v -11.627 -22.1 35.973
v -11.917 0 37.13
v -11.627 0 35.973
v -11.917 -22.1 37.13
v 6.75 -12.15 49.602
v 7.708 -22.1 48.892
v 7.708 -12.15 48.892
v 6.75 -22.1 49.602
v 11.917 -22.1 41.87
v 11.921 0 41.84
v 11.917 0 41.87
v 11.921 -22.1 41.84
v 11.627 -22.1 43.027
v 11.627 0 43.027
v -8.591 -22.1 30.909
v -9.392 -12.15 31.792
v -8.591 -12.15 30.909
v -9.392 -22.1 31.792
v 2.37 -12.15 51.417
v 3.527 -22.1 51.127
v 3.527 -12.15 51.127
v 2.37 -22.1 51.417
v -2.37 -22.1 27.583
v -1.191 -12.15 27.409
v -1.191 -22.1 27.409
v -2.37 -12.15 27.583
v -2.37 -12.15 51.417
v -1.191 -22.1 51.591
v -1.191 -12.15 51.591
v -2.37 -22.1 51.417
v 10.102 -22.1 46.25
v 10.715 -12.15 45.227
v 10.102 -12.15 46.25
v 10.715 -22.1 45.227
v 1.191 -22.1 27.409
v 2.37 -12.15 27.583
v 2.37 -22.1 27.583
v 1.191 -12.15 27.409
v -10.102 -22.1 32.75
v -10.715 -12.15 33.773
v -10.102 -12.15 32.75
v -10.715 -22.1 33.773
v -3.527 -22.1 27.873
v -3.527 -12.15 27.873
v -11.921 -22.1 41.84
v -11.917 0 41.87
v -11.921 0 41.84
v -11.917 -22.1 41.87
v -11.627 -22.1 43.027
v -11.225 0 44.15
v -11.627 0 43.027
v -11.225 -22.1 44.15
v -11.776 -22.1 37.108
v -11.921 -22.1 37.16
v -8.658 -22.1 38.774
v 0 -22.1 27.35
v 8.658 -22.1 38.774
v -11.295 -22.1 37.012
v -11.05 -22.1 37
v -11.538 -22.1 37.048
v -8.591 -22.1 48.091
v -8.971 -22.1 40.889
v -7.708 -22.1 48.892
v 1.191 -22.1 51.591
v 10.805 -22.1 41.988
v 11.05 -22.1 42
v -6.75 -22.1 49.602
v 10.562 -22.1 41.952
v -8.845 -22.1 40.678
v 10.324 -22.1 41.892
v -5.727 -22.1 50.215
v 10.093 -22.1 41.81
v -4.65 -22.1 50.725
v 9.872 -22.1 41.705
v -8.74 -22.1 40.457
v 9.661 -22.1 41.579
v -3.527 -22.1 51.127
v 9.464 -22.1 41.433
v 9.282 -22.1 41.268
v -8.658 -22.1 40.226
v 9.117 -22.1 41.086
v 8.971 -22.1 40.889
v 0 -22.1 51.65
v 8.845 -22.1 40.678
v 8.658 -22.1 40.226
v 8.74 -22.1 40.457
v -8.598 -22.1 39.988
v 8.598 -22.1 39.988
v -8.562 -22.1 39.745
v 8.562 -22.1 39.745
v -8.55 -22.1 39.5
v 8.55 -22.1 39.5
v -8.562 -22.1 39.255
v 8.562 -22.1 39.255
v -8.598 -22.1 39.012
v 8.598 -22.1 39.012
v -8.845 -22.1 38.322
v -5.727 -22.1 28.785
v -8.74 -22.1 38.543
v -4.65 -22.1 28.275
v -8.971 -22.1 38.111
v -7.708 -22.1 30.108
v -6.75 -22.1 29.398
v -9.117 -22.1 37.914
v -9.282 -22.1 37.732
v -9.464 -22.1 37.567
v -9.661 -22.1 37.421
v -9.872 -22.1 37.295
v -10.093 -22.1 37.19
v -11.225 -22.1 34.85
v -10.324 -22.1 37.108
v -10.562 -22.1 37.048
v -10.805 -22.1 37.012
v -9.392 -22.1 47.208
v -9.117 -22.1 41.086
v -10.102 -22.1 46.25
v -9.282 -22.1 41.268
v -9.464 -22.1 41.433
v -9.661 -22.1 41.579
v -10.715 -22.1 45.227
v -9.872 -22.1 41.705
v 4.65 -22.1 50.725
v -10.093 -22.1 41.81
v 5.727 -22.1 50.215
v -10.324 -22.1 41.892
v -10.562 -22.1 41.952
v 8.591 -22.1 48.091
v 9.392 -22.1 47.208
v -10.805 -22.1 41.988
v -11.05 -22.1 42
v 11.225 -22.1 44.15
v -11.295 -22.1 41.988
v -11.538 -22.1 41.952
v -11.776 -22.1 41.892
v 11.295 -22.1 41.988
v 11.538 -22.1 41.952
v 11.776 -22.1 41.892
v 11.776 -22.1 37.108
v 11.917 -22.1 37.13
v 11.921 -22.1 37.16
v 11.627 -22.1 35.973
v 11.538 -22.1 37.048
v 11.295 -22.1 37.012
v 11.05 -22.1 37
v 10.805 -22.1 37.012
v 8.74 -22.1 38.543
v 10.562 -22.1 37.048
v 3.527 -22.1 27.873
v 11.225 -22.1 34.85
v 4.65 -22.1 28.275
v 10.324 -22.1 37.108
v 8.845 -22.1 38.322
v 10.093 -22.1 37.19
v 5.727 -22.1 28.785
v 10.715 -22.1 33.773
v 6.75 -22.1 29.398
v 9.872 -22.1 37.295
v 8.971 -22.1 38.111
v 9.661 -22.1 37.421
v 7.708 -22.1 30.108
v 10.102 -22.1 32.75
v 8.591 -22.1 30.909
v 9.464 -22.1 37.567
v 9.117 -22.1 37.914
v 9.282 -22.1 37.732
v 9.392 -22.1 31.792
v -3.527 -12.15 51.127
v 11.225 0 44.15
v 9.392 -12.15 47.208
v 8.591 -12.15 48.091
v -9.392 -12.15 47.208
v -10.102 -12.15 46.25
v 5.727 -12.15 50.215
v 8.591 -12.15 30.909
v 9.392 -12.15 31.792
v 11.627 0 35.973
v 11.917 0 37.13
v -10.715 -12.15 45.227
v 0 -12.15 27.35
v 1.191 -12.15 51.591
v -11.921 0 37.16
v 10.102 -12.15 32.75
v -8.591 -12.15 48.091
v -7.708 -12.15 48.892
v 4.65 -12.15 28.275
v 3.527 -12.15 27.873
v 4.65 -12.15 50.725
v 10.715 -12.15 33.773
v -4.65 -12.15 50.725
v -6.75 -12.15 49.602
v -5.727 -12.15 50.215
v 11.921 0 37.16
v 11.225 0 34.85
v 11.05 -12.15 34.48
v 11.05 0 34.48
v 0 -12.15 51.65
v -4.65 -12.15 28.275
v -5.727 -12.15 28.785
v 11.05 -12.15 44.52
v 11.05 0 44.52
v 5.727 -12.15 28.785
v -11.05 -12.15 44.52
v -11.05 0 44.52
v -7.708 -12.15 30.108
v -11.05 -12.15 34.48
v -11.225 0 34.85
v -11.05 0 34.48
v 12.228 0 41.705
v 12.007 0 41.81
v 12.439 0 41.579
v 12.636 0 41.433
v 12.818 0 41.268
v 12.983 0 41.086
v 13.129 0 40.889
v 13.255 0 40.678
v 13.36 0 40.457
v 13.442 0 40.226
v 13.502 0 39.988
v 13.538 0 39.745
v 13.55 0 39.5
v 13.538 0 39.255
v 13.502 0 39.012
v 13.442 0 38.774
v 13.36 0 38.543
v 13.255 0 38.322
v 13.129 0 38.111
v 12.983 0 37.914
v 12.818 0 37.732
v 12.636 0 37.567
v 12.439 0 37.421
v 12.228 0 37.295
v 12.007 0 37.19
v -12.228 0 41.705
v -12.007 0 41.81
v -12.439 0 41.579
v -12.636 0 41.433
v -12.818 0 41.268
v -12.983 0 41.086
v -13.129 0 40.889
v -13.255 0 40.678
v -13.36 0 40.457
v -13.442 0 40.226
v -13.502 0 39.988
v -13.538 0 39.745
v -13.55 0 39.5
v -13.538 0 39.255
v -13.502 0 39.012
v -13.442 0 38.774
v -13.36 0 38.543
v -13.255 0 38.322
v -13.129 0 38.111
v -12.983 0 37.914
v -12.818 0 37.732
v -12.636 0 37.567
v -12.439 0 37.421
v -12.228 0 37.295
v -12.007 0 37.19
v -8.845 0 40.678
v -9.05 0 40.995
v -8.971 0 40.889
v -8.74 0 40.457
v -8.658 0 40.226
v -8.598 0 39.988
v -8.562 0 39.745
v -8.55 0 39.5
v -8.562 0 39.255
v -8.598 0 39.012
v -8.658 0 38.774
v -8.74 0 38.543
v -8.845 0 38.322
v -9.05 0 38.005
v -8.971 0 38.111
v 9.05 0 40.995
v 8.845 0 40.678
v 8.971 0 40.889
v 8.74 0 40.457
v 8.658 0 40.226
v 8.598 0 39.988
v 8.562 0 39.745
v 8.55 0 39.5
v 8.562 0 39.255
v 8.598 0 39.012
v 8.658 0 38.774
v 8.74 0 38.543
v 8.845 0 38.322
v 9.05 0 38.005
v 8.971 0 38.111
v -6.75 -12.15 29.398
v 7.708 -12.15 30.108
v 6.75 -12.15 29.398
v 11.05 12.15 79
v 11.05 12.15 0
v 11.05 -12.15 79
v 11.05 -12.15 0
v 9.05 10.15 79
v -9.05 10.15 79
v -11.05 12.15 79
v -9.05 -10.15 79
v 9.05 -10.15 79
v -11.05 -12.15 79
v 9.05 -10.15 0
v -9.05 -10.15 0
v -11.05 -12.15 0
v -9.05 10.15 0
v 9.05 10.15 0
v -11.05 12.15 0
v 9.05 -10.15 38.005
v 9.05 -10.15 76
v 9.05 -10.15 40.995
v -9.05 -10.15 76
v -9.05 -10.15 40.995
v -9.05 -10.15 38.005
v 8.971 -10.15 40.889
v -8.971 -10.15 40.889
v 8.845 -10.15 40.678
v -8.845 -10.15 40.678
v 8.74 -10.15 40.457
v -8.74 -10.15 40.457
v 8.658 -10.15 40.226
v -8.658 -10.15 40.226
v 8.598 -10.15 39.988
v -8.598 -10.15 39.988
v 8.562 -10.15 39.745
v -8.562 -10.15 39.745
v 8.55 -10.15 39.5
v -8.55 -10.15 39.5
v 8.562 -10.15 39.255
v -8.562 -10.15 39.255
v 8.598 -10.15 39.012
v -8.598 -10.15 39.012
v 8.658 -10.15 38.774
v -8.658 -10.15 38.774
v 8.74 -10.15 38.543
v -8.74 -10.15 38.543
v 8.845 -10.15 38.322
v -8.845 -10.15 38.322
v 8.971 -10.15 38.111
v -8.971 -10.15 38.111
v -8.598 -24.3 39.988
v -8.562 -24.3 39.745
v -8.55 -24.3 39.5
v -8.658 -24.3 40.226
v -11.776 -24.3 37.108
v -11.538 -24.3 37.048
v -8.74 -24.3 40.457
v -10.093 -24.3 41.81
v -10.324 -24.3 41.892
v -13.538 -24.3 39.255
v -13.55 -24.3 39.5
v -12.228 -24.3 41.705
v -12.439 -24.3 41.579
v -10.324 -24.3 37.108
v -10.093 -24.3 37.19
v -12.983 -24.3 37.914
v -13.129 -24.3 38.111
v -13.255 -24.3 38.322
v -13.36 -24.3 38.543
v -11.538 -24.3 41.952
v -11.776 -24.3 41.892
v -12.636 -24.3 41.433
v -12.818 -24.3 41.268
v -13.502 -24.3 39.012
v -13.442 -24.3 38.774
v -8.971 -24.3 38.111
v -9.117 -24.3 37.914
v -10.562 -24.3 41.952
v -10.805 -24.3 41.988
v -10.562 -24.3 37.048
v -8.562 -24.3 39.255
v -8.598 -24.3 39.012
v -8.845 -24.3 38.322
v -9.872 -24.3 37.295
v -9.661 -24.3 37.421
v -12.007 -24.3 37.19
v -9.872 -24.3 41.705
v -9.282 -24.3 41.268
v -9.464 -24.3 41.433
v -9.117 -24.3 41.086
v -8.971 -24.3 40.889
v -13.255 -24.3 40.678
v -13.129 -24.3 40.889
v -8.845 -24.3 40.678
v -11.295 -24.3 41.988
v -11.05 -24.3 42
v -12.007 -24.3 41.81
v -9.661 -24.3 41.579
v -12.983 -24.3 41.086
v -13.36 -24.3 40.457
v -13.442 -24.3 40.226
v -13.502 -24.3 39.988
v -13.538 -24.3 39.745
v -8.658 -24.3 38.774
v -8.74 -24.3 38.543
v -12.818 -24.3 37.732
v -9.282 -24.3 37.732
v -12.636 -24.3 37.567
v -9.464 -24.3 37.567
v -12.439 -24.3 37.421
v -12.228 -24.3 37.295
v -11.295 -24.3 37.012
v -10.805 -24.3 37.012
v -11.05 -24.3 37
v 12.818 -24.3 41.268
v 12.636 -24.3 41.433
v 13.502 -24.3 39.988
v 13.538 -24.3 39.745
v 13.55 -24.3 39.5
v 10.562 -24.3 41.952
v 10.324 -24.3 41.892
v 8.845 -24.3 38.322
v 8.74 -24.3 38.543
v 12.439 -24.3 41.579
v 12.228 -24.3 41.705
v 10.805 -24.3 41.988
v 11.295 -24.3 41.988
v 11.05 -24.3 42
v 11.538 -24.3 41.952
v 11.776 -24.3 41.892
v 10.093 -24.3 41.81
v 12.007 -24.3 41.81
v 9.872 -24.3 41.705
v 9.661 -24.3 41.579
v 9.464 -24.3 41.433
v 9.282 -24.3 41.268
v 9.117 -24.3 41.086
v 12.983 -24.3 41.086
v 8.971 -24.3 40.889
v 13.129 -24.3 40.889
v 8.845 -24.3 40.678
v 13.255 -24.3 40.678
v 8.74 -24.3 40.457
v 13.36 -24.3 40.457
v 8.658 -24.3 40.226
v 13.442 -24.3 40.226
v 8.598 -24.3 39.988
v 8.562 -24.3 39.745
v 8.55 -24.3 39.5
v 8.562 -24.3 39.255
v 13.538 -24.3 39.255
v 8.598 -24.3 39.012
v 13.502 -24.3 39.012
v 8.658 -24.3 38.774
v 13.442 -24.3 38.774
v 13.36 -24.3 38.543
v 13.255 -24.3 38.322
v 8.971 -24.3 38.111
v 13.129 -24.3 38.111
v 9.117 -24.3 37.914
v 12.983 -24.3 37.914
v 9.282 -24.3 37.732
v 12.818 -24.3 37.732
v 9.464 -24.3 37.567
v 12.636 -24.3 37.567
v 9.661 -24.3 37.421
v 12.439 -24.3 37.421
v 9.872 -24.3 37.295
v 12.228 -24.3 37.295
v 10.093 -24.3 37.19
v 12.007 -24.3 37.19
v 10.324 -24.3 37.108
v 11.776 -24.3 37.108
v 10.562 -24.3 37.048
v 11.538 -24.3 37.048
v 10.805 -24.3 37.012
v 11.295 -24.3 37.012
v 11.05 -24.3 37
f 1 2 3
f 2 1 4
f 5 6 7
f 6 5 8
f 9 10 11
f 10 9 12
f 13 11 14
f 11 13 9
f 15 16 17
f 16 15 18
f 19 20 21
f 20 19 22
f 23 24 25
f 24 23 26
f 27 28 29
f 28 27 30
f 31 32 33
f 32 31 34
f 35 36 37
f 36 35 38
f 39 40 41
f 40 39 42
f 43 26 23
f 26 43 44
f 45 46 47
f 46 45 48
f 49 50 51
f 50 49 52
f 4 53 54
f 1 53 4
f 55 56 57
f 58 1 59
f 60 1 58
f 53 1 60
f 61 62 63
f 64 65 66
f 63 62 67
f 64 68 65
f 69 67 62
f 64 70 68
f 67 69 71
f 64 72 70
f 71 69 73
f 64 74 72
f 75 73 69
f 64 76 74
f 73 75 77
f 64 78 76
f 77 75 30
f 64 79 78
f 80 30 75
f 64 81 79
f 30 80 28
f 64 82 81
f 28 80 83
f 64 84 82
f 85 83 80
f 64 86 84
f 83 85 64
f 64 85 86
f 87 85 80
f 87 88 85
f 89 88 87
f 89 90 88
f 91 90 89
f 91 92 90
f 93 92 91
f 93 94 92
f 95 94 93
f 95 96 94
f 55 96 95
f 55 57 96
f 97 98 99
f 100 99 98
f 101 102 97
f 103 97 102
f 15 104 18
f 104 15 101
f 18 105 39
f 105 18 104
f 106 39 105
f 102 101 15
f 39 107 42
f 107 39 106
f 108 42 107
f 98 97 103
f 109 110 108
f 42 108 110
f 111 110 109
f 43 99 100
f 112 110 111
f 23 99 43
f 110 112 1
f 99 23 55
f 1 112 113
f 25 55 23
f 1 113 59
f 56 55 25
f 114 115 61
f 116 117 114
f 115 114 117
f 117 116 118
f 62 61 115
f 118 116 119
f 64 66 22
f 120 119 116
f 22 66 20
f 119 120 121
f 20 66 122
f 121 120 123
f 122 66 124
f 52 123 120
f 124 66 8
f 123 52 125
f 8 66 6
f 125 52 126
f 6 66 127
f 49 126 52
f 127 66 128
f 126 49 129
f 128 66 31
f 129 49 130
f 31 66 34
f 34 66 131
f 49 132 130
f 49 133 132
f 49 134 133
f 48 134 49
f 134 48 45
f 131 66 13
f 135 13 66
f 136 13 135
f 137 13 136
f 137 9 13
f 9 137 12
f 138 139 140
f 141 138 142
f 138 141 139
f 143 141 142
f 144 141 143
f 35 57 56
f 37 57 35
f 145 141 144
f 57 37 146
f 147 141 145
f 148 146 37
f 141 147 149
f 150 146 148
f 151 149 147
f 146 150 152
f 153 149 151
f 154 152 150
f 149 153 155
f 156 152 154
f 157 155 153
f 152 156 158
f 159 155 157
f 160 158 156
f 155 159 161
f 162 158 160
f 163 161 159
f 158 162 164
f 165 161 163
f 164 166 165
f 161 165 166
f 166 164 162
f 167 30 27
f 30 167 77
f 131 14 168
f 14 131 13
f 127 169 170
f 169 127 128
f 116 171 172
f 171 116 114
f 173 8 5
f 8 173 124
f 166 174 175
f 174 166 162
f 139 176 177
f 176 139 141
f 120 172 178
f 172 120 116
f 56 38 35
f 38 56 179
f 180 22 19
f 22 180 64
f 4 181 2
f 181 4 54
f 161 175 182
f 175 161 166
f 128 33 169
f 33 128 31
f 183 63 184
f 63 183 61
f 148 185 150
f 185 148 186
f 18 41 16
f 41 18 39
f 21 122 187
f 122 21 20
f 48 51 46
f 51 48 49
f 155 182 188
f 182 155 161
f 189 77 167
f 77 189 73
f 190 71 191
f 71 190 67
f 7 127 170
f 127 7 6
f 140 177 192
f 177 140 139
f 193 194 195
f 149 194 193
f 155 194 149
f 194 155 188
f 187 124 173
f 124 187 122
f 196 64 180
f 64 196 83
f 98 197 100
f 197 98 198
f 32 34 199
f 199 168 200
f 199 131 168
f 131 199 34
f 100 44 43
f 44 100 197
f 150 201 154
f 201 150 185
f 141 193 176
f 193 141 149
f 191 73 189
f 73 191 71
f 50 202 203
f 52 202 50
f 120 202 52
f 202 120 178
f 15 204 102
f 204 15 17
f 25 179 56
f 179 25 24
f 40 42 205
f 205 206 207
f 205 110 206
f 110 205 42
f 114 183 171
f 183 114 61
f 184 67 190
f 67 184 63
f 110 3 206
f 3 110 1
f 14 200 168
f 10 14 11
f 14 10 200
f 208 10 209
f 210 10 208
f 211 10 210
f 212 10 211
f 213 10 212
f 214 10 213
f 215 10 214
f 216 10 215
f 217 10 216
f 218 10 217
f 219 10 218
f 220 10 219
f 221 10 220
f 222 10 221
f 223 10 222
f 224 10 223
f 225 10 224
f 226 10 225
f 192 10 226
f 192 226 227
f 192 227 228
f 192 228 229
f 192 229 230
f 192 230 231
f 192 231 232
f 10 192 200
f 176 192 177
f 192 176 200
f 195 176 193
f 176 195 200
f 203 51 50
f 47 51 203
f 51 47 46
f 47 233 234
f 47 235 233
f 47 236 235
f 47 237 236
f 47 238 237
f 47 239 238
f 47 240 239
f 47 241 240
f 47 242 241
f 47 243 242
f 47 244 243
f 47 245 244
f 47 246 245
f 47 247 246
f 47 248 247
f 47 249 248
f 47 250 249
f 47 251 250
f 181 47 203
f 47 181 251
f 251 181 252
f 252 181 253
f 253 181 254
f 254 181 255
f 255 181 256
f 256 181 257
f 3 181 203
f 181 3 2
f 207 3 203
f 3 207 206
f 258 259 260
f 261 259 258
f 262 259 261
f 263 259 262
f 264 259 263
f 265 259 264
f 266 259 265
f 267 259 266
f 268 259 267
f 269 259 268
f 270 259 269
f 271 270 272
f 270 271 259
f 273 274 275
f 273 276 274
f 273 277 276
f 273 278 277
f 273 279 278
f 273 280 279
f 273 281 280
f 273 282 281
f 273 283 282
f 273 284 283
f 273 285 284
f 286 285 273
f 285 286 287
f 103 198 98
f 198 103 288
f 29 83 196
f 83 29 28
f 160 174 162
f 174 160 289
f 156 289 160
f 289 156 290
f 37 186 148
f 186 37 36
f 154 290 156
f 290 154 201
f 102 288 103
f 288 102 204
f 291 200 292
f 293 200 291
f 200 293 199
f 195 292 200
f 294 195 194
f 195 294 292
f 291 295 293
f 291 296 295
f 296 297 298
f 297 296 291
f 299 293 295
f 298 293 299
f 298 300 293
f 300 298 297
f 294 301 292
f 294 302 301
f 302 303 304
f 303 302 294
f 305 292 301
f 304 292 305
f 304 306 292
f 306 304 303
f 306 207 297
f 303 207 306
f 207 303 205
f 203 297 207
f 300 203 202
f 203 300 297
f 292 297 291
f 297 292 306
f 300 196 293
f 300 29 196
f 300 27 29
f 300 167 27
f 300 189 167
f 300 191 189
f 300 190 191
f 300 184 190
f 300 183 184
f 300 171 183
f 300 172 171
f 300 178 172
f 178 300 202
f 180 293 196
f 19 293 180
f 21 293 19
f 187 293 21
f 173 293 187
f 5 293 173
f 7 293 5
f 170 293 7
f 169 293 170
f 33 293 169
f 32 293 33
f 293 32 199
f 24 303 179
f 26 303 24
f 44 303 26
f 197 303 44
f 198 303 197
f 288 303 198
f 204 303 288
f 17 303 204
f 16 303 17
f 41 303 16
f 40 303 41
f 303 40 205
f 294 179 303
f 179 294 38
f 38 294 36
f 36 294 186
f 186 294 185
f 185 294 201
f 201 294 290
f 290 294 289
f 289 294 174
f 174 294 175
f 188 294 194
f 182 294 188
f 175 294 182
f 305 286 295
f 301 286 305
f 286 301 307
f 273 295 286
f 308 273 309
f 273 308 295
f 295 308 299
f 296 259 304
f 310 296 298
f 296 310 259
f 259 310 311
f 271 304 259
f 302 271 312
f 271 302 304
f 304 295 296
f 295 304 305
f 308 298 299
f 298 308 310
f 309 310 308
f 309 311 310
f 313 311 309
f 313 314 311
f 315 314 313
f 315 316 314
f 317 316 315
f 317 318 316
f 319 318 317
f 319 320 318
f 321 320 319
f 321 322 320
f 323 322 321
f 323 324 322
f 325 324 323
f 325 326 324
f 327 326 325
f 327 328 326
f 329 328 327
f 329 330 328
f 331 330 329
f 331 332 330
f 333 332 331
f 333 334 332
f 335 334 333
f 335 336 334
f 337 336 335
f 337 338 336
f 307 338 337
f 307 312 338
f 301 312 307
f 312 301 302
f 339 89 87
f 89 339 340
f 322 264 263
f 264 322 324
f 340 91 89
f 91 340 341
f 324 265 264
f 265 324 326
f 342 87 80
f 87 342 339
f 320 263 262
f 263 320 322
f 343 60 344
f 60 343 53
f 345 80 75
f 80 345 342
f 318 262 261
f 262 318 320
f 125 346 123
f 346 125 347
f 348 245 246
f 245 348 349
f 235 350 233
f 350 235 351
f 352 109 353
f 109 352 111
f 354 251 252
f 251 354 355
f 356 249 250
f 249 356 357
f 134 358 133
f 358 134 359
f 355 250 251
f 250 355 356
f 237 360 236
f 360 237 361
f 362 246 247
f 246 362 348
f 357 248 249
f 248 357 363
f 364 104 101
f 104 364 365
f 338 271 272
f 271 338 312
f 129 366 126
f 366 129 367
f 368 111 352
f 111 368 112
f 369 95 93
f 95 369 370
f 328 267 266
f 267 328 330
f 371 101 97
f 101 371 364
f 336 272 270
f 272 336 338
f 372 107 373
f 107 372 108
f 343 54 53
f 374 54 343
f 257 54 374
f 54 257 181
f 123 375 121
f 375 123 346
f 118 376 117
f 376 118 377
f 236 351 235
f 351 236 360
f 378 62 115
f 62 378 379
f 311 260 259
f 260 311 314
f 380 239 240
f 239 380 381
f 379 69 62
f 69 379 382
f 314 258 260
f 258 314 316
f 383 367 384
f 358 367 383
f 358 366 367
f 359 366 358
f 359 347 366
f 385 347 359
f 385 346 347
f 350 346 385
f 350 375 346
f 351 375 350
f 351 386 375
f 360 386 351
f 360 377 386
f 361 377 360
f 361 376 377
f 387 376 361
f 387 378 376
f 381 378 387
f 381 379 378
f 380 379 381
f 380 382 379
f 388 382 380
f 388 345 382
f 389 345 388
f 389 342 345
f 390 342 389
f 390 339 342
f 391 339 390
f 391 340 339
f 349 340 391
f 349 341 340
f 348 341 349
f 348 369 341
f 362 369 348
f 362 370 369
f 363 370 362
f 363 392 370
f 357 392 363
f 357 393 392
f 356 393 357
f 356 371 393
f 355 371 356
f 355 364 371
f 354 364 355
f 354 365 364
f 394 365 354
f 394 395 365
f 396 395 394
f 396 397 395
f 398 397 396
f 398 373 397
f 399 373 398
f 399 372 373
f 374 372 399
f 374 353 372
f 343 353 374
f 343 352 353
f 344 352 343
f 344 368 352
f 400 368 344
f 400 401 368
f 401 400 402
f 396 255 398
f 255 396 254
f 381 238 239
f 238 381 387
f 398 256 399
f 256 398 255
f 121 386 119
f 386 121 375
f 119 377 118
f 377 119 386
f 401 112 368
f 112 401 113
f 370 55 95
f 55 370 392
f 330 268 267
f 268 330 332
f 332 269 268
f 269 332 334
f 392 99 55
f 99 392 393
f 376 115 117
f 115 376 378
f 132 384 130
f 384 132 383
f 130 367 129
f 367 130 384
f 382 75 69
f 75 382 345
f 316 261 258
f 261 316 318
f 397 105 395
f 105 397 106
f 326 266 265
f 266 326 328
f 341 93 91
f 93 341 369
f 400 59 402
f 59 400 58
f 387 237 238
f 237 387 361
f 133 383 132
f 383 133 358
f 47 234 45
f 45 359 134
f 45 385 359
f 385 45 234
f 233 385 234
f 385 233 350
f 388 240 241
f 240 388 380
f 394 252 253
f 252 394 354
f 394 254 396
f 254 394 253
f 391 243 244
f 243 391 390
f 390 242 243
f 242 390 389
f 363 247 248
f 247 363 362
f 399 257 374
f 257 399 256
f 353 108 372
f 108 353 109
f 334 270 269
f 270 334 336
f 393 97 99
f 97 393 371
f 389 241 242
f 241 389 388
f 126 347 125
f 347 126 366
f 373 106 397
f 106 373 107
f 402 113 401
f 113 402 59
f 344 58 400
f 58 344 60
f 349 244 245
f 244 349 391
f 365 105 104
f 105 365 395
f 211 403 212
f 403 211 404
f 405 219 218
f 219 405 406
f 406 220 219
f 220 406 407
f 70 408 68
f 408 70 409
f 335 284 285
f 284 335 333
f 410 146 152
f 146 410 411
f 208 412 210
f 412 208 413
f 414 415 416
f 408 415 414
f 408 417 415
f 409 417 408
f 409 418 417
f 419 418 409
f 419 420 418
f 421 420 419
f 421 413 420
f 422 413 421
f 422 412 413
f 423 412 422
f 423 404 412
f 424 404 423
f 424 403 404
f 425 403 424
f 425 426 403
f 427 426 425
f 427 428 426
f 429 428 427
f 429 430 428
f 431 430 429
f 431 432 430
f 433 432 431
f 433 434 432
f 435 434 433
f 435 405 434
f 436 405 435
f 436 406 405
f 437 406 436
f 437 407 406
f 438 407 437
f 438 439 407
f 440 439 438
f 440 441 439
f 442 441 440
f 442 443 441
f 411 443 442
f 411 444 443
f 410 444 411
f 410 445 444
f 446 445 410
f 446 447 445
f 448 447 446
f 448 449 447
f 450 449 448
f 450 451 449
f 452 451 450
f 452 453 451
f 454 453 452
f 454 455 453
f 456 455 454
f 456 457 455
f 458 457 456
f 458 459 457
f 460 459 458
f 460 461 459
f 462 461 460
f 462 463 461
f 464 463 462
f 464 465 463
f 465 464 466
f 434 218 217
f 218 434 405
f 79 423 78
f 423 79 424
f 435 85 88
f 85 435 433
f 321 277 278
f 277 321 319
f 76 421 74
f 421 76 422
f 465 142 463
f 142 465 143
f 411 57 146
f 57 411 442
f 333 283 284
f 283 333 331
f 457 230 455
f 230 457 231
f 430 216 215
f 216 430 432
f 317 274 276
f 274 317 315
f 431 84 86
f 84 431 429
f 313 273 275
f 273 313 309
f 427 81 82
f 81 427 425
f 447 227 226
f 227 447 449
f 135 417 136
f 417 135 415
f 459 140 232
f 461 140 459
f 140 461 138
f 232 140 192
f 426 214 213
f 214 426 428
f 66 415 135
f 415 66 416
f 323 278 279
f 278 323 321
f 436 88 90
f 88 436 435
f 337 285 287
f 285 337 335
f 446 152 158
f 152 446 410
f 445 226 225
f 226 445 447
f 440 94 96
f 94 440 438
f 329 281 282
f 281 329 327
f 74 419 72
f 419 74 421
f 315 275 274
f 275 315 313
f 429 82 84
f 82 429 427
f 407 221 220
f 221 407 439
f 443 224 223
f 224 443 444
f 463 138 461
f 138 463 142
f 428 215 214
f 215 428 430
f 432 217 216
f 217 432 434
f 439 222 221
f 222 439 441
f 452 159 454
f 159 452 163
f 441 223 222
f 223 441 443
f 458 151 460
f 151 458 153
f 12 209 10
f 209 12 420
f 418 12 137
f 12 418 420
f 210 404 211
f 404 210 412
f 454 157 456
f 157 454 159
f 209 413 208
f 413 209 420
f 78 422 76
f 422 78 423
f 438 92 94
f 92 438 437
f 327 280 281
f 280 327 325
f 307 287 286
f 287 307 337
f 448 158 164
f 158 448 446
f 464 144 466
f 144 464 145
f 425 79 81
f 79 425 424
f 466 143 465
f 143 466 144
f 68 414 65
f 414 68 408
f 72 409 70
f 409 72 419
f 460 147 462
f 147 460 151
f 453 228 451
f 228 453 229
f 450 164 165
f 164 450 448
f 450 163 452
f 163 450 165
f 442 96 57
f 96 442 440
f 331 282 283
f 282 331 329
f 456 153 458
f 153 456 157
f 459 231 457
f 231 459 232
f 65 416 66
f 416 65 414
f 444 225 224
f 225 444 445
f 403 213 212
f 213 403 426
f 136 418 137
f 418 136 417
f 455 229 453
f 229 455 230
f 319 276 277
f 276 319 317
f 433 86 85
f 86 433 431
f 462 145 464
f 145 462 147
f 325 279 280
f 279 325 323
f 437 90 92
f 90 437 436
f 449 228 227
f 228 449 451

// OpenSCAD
module u_shaped_bracket() {
    difference() {
        // Main U-shaped body
        union() {
            // Outer rounded back
            translate([0, 0, 39.5])
                rotate([90, 0, 0])
                cylinder(h=22.1, r=12.15, $fn=64);
            
            // Side walls
            translate([-11.05, -12.15, 0])
                cube([22.1, 24.3, 79.0]);
        }
        
        // Inner channel
        translate([-9.05, -10.15, 0])
            cube([18.1, 20.3, 79.0]);
        
        // Fillets on outer perimeter
        translate([-11.05, -12.15, 0])
            offset(r=2)
            cube([22.1, 24.3, 79.0]);
    }
    
    // Circular through-holes on side walls
    translate([-11.05, 0, 39.5])
        rotate([90, 0, 0])
        cylinder(h=24.3, r=2.5, $fn=64);
    
    translate([11.05, 0, 39.5])
        rotate([90, 0, 0])
        cylinder(h=24.3, r=2.5, $fn=64);
    
    // Top-front corner tabs/lips
    translate([-11.05, -12.15, 76])
        cube([22.1, 2, 3]);
}

u_shaped_bracket();
